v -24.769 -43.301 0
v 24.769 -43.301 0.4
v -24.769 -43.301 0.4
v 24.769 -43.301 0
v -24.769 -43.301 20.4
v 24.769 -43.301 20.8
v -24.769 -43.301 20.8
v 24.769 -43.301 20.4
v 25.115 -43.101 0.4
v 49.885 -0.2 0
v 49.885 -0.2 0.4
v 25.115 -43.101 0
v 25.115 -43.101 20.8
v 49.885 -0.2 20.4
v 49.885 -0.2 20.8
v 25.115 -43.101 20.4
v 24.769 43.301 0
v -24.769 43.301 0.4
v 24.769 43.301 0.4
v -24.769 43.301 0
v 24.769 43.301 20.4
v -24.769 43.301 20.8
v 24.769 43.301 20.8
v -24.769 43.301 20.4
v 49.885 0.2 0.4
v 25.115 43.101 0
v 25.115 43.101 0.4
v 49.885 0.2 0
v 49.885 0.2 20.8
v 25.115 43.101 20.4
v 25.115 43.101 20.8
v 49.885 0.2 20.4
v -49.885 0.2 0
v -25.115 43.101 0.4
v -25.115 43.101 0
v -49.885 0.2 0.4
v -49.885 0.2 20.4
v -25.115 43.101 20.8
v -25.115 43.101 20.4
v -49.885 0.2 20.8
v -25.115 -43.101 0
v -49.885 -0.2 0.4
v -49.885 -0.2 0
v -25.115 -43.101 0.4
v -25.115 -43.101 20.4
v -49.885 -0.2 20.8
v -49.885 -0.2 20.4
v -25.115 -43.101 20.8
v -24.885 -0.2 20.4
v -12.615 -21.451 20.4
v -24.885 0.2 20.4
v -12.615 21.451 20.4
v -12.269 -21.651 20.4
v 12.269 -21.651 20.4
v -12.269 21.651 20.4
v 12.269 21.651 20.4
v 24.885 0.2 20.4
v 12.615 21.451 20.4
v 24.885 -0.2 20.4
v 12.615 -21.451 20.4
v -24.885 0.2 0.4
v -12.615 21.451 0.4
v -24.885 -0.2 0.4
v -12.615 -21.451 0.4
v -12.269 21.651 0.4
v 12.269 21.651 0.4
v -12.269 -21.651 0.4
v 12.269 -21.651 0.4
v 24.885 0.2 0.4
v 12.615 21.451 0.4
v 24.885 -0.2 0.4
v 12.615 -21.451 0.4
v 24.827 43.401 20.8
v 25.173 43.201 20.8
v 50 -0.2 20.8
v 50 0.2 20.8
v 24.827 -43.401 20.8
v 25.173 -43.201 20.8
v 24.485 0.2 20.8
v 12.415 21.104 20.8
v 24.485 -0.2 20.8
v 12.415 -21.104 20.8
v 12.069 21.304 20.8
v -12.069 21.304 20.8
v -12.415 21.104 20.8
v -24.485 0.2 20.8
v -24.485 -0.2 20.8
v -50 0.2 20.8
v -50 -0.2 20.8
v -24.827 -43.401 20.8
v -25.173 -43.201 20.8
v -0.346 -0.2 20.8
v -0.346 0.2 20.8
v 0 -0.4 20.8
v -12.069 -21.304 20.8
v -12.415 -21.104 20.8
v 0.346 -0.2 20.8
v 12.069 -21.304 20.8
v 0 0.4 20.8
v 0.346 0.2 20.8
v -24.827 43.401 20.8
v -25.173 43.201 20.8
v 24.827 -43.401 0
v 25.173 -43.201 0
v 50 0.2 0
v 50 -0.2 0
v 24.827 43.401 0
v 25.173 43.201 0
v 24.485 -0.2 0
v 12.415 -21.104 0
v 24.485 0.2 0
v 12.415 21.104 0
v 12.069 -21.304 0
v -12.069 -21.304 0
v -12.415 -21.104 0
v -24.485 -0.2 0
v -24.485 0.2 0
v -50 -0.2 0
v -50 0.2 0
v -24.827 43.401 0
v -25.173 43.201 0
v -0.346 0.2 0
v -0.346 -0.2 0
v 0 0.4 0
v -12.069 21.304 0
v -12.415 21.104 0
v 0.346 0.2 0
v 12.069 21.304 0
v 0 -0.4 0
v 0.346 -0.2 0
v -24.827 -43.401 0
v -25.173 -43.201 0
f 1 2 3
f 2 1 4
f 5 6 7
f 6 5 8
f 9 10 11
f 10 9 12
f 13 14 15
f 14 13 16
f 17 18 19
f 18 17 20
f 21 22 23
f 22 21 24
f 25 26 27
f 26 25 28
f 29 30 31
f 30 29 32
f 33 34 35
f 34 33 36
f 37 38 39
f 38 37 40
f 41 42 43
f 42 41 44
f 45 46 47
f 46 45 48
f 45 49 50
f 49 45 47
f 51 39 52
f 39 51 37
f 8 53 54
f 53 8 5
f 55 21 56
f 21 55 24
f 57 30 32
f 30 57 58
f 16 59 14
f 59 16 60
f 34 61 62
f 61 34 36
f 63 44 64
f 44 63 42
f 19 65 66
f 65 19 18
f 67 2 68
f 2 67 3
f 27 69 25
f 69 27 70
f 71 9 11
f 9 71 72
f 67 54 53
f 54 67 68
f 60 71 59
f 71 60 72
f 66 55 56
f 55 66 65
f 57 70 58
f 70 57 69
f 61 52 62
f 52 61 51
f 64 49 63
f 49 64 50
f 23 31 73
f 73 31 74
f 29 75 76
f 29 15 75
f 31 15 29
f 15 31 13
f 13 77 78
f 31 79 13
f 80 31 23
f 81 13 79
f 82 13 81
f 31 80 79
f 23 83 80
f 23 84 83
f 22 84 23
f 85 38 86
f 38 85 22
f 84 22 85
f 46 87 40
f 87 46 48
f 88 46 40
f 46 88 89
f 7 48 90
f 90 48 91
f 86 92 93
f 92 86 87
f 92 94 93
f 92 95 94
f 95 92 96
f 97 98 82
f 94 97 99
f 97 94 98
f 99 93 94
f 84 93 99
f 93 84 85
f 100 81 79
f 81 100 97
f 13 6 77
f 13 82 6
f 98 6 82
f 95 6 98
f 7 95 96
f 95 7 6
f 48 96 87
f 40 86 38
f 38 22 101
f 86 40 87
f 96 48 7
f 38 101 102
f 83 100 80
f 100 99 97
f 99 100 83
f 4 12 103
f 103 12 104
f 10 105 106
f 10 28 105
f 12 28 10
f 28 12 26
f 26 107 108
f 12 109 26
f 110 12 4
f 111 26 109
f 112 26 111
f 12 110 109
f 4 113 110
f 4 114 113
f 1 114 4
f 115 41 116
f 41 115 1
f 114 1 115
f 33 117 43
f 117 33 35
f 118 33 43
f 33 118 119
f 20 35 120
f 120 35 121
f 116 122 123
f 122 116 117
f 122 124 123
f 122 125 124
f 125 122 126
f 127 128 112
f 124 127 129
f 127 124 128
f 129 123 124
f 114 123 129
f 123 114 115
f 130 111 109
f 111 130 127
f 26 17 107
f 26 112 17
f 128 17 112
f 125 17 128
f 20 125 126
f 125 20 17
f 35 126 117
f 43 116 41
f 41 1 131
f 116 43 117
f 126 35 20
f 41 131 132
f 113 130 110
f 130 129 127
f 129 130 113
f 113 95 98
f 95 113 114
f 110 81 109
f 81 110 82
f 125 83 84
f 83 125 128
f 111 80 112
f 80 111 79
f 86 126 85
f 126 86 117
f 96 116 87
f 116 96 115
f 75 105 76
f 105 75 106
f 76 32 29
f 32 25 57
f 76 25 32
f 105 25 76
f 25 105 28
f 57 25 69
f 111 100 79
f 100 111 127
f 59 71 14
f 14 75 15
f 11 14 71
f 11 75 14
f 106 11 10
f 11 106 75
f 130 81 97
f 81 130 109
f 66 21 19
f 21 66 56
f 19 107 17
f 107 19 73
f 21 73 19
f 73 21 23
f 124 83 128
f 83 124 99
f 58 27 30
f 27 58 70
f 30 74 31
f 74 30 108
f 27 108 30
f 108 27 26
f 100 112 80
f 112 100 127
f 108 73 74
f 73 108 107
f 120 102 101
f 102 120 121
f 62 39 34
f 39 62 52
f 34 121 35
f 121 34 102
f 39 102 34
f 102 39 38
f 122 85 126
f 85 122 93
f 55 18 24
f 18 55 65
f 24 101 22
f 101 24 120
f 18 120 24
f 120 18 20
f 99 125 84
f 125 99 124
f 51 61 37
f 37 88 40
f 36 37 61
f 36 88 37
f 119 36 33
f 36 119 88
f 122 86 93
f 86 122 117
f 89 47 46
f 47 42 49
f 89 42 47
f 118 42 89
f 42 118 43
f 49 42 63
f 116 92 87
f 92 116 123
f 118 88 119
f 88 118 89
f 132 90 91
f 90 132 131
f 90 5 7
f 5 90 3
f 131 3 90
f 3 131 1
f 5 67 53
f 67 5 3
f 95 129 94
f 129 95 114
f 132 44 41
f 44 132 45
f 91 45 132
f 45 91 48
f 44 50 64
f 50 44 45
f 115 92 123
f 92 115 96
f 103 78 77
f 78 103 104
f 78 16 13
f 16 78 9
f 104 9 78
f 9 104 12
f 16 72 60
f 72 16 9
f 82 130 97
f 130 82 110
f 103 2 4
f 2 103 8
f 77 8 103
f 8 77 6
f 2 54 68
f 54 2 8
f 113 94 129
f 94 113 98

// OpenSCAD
$fn=6;

w=0.4;

difference()
{
    cylinder(d=100,h=20+2*w);
    
    translate([0,0,w])
    difference()
    {
        cylinder(d=100,h=20);
        cylinder(d=50,h=20);
    }

    cylinder(d=50-2*w,h=20+2*w);
}

for(i=[0:360/$fn:360])
{
    rotate([0,0,i])
    translate([0,-w/2,0])
    #cube([50,w,20+2*w]);
}
